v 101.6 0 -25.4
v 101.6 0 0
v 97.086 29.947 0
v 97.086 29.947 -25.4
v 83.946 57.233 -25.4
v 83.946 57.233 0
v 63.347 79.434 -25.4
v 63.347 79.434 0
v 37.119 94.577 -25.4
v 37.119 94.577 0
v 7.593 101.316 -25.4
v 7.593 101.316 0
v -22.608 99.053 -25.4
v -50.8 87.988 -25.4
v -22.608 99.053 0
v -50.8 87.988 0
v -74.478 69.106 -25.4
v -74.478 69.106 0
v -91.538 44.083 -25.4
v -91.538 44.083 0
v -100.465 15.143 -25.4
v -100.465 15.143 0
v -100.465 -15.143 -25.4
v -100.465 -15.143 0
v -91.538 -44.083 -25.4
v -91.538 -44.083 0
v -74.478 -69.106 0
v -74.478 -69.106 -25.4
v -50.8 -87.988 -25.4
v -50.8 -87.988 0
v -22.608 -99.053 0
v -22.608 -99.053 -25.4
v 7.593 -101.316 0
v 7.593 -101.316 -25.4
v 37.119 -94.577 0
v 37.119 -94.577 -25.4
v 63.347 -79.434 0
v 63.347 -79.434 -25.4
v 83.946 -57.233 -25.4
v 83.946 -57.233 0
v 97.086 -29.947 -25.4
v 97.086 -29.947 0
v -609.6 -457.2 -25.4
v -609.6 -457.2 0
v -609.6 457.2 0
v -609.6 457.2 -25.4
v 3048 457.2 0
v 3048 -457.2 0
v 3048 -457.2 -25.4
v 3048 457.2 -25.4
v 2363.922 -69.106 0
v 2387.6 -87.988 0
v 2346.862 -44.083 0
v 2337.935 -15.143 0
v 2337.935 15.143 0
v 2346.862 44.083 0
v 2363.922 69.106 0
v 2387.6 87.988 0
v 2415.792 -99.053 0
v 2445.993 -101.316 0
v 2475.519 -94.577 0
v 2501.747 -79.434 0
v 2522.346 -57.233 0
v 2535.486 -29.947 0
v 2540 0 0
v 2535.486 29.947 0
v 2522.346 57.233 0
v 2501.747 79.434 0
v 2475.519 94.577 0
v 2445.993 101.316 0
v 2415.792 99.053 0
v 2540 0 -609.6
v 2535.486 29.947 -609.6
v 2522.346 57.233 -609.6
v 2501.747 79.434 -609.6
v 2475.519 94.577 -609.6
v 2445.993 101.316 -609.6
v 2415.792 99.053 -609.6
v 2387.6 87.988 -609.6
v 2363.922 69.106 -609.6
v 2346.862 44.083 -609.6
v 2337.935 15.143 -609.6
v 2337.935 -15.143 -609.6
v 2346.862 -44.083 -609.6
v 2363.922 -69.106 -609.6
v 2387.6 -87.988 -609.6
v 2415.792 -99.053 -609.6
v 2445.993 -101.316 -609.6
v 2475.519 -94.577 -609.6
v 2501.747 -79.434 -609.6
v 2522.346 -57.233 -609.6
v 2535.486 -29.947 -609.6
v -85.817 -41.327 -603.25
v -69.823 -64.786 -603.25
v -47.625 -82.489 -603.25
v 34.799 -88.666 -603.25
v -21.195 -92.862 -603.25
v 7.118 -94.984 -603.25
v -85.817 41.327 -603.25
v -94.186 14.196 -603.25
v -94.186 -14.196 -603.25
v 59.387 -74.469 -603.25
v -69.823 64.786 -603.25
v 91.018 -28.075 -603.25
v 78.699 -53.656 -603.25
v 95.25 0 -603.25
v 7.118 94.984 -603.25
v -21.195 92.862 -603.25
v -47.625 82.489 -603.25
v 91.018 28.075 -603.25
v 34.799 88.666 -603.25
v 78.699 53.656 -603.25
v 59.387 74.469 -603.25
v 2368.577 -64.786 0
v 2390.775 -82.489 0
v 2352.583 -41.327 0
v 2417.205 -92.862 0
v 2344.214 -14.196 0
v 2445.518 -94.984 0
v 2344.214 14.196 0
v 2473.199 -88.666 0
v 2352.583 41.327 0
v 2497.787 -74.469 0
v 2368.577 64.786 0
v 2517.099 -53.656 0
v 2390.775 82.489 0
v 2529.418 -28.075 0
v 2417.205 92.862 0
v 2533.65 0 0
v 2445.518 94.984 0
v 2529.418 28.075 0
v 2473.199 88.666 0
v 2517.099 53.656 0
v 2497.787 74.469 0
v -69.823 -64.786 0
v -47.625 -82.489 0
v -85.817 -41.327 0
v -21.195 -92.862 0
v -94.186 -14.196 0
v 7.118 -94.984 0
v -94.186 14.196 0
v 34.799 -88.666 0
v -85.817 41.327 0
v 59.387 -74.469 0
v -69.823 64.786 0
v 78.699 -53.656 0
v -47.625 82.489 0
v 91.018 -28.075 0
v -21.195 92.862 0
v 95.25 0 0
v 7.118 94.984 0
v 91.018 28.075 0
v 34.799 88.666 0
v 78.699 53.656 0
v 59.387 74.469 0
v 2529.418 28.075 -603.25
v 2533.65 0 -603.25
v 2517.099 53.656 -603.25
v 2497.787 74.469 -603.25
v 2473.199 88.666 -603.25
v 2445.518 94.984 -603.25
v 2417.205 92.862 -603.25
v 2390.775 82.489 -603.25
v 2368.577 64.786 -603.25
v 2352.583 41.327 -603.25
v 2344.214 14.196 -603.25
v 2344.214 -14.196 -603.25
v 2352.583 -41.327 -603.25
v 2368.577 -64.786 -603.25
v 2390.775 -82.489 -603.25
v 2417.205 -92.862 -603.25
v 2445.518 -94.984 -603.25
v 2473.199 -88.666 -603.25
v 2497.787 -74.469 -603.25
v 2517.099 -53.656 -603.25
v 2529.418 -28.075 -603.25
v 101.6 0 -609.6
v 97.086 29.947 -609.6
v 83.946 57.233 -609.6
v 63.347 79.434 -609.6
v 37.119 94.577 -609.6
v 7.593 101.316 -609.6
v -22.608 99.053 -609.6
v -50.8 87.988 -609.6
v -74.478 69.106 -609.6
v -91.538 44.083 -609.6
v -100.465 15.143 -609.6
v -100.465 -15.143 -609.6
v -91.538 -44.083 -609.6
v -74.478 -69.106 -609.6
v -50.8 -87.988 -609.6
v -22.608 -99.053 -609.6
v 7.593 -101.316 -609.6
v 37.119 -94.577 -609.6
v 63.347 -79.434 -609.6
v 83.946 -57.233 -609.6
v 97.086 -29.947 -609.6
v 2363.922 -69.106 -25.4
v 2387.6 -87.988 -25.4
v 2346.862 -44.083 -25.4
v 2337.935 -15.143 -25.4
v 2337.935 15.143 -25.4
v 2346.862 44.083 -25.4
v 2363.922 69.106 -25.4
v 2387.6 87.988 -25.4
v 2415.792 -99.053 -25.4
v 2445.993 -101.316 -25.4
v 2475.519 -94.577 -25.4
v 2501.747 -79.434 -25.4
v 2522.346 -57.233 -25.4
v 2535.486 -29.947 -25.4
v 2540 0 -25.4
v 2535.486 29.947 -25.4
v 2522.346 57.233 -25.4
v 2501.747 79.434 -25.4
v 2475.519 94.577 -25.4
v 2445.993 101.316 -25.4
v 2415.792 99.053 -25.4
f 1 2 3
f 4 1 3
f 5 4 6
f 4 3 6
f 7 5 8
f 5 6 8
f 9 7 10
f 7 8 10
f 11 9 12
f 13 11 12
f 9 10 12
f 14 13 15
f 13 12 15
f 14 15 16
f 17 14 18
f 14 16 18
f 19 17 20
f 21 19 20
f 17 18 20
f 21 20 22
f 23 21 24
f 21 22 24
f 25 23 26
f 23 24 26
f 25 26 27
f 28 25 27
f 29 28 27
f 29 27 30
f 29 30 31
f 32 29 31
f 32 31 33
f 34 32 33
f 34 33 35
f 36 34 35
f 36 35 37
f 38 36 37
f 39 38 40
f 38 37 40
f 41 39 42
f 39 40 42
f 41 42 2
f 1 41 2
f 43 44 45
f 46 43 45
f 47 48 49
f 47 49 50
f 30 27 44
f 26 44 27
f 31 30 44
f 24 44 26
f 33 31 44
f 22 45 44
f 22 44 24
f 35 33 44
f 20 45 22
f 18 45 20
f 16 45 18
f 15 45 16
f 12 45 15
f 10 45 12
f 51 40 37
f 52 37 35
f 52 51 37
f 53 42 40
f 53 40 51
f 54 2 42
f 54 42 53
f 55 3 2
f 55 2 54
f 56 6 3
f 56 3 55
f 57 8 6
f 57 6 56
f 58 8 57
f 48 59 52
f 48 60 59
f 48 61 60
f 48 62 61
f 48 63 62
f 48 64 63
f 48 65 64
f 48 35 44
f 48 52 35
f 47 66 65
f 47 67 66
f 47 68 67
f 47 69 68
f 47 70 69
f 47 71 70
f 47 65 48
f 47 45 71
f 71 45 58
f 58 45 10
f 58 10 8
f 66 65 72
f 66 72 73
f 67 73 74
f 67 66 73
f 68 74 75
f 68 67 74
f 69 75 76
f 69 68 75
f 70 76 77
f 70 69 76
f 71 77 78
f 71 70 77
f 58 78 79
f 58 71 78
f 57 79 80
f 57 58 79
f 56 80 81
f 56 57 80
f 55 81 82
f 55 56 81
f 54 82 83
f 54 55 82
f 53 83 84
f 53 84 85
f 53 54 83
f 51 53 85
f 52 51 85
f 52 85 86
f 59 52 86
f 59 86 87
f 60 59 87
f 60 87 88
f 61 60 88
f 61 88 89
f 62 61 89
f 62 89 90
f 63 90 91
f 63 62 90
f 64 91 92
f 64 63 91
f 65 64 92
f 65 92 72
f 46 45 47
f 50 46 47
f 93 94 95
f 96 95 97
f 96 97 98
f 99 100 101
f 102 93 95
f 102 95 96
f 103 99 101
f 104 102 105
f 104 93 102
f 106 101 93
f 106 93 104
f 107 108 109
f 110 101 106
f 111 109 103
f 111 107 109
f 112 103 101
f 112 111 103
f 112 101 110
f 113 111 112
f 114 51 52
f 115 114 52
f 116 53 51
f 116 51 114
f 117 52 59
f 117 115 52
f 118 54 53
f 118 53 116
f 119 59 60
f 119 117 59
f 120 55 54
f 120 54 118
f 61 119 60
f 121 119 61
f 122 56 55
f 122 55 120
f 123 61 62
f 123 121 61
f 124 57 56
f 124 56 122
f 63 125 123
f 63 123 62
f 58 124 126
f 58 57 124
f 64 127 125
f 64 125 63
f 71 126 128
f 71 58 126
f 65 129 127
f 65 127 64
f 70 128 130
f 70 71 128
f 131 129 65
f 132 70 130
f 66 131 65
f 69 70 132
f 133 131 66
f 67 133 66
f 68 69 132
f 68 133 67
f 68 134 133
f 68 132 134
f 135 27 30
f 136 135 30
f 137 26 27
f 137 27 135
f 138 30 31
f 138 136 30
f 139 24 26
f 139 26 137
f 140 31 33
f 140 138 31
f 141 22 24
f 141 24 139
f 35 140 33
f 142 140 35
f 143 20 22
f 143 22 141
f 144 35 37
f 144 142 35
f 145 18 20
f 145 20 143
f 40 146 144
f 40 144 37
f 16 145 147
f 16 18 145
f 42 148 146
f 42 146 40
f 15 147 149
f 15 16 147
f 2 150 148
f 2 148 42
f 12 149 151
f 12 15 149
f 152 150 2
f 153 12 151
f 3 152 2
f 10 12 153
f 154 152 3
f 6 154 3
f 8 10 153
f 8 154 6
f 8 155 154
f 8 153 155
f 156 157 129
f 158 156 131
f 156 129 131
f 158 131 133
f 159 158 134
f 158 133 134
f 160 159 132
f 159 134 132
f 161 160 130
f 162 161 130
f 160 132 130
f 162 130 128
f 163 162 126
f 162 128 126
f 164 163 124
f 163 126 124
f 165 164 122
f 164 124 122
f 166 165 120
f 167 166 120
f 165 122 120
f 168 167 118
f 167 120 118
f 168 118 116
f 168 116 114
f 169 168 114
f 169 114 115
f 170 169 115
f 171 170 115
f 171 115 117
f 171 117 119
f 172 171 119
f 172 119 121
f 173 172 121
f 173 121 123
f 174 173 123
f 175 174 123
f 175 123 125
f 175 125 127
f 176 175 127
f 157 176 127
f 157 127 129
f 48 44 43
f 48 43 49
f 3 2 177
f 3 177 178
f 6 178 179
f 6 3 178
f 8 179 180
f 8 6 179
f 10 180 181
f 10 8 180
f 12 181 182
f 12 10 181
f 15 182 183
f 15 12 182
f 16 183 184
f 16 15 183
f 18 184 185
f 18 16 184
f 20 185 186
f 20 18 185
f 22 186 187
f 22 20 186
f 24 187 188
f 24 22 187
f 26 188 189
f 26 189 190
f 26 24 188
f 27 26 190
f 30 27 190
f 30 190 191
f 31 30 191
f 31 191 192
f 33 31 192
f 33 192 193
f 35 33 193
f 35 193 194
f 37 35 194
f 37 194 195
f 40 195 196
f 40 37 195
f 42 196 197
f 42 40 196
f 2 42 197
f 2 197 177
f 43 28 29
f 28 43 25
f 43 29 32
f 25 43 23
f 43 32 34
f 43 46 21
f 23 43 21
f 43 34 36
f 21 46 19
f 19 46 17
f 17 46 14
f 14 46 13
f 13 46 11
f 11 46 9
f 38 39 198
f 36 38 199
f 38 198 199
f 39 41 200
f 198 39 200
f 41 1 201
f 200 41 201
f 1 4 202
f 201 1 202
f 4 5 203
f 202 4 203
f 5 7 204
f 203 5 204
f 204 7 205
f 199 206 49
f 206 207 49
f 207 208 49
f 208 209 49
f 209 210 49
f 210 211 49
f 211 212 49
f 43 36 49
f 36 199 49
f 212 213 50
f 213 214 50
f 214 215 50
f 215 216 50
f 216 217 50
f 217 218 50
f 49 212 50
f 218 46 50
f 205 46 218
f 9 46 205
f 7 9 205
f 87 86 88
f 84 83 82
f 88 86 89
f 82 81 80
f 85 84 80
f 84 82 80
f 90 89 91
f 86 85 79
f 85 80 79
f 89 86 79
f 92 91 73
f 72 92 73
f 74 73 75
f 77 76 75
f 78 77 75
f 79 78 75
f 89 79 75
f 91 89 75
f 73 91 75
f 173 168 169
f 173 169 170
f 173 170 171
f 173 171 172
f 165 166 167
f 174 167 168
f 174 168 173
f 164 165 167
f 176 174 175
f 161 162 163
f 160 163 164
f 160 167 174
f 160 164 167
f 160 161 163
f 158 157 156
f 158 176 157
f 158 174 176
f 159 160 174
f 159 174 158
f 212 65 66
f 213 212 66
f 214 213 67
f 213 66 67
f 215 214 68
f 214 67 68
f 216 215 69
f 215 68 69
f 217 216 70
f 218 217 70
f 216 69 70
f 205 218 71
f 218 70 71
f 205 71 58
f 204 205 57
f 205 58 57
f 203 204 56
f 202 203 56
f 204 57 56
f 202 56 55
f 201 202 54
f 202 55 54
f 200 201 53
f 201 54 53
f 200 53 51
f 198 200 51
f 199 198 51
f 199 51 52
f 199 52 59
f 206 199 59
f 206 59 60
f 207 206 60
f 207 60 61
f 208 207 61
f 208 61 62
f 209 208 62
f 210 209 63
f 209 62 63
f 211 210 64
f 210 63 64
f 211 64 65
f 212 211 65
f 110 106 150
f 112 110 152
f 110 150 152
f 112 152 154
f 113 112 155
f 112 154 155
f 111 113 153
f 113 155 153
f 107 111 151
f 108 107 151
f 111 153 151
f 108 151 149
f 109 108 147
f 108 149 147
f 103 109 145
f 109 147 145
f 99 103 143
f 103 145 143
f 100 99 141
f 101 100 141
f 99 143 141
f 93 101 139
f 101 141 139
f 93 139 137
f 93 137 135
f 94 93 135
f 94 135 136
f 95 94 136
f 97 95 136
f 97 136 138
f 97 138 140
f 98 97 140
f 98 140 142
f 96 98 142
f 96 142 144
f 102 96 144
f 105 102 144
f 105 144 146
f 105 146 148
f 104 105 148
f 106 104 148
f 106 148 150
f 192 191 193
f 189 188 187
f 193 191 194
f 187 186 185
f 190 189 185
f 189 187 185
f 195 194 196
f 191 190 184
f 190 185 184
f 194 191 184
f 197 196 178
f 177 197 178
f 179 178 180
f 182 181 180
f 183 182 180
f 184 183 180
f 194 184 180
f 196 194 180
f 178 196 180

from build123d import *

# Parameters (mm, degrees)
F0_R     = 101.6
F1_DEPTH = 609.6
F2_T     = -6.35
F2_2_T   = -6.35
F3_W     = 3657.6
F3_H     = 914.4
F3_R     = 101.6
F4_DEPTH = 25.4


with BuildPart() as f1:
    # F0 (on Top) → F1 (new body)
    with BuildSketch(Plane.XY):
        Circle(F0_R)
    extrude(amount=-F1_DEPTH)

    # F2
    f2_openings = [f1.faces().sort_by_distance(p)[0] for p in [
        (0, 0, 0),
    ]]
    offset(amount=F2_T, openings=f2_openings)


with BuildPart() as f1b:
    # F0 (on Top) → F1, piece 2 (new body)
    with BuildSketch(Plane.XY):
        with Locations((2438.4, 0)):
            Circle(F0_R)
    extrude(amount=-F1_DEPTH)

    # F2#2
    f2_2_openings = [f1b.faces().sort_by_distance(p)[0] for p in [
        (2438.4, 0, 0),
    ]]
    offset(amount=F2_2_T, openings=f2_2_openings)


with BuildPart() as f4:
    # F3 (on face) → F4 (new body)
    with BuildSketch(Plane.XY):
        with Locations((1219.2, 0)):
            Rectangle(F3_W, F3_H)
        Circle(F3_R, mode=Mode.SUBTRACT)
        with Locations((2438.4, 0)):
            Circle(F3_R, mode=Mode.SUBTRACT)
    extrude(amount=-F4_DEPTH)


solid = Compound([f1.part, f1b.part, f4.part])
